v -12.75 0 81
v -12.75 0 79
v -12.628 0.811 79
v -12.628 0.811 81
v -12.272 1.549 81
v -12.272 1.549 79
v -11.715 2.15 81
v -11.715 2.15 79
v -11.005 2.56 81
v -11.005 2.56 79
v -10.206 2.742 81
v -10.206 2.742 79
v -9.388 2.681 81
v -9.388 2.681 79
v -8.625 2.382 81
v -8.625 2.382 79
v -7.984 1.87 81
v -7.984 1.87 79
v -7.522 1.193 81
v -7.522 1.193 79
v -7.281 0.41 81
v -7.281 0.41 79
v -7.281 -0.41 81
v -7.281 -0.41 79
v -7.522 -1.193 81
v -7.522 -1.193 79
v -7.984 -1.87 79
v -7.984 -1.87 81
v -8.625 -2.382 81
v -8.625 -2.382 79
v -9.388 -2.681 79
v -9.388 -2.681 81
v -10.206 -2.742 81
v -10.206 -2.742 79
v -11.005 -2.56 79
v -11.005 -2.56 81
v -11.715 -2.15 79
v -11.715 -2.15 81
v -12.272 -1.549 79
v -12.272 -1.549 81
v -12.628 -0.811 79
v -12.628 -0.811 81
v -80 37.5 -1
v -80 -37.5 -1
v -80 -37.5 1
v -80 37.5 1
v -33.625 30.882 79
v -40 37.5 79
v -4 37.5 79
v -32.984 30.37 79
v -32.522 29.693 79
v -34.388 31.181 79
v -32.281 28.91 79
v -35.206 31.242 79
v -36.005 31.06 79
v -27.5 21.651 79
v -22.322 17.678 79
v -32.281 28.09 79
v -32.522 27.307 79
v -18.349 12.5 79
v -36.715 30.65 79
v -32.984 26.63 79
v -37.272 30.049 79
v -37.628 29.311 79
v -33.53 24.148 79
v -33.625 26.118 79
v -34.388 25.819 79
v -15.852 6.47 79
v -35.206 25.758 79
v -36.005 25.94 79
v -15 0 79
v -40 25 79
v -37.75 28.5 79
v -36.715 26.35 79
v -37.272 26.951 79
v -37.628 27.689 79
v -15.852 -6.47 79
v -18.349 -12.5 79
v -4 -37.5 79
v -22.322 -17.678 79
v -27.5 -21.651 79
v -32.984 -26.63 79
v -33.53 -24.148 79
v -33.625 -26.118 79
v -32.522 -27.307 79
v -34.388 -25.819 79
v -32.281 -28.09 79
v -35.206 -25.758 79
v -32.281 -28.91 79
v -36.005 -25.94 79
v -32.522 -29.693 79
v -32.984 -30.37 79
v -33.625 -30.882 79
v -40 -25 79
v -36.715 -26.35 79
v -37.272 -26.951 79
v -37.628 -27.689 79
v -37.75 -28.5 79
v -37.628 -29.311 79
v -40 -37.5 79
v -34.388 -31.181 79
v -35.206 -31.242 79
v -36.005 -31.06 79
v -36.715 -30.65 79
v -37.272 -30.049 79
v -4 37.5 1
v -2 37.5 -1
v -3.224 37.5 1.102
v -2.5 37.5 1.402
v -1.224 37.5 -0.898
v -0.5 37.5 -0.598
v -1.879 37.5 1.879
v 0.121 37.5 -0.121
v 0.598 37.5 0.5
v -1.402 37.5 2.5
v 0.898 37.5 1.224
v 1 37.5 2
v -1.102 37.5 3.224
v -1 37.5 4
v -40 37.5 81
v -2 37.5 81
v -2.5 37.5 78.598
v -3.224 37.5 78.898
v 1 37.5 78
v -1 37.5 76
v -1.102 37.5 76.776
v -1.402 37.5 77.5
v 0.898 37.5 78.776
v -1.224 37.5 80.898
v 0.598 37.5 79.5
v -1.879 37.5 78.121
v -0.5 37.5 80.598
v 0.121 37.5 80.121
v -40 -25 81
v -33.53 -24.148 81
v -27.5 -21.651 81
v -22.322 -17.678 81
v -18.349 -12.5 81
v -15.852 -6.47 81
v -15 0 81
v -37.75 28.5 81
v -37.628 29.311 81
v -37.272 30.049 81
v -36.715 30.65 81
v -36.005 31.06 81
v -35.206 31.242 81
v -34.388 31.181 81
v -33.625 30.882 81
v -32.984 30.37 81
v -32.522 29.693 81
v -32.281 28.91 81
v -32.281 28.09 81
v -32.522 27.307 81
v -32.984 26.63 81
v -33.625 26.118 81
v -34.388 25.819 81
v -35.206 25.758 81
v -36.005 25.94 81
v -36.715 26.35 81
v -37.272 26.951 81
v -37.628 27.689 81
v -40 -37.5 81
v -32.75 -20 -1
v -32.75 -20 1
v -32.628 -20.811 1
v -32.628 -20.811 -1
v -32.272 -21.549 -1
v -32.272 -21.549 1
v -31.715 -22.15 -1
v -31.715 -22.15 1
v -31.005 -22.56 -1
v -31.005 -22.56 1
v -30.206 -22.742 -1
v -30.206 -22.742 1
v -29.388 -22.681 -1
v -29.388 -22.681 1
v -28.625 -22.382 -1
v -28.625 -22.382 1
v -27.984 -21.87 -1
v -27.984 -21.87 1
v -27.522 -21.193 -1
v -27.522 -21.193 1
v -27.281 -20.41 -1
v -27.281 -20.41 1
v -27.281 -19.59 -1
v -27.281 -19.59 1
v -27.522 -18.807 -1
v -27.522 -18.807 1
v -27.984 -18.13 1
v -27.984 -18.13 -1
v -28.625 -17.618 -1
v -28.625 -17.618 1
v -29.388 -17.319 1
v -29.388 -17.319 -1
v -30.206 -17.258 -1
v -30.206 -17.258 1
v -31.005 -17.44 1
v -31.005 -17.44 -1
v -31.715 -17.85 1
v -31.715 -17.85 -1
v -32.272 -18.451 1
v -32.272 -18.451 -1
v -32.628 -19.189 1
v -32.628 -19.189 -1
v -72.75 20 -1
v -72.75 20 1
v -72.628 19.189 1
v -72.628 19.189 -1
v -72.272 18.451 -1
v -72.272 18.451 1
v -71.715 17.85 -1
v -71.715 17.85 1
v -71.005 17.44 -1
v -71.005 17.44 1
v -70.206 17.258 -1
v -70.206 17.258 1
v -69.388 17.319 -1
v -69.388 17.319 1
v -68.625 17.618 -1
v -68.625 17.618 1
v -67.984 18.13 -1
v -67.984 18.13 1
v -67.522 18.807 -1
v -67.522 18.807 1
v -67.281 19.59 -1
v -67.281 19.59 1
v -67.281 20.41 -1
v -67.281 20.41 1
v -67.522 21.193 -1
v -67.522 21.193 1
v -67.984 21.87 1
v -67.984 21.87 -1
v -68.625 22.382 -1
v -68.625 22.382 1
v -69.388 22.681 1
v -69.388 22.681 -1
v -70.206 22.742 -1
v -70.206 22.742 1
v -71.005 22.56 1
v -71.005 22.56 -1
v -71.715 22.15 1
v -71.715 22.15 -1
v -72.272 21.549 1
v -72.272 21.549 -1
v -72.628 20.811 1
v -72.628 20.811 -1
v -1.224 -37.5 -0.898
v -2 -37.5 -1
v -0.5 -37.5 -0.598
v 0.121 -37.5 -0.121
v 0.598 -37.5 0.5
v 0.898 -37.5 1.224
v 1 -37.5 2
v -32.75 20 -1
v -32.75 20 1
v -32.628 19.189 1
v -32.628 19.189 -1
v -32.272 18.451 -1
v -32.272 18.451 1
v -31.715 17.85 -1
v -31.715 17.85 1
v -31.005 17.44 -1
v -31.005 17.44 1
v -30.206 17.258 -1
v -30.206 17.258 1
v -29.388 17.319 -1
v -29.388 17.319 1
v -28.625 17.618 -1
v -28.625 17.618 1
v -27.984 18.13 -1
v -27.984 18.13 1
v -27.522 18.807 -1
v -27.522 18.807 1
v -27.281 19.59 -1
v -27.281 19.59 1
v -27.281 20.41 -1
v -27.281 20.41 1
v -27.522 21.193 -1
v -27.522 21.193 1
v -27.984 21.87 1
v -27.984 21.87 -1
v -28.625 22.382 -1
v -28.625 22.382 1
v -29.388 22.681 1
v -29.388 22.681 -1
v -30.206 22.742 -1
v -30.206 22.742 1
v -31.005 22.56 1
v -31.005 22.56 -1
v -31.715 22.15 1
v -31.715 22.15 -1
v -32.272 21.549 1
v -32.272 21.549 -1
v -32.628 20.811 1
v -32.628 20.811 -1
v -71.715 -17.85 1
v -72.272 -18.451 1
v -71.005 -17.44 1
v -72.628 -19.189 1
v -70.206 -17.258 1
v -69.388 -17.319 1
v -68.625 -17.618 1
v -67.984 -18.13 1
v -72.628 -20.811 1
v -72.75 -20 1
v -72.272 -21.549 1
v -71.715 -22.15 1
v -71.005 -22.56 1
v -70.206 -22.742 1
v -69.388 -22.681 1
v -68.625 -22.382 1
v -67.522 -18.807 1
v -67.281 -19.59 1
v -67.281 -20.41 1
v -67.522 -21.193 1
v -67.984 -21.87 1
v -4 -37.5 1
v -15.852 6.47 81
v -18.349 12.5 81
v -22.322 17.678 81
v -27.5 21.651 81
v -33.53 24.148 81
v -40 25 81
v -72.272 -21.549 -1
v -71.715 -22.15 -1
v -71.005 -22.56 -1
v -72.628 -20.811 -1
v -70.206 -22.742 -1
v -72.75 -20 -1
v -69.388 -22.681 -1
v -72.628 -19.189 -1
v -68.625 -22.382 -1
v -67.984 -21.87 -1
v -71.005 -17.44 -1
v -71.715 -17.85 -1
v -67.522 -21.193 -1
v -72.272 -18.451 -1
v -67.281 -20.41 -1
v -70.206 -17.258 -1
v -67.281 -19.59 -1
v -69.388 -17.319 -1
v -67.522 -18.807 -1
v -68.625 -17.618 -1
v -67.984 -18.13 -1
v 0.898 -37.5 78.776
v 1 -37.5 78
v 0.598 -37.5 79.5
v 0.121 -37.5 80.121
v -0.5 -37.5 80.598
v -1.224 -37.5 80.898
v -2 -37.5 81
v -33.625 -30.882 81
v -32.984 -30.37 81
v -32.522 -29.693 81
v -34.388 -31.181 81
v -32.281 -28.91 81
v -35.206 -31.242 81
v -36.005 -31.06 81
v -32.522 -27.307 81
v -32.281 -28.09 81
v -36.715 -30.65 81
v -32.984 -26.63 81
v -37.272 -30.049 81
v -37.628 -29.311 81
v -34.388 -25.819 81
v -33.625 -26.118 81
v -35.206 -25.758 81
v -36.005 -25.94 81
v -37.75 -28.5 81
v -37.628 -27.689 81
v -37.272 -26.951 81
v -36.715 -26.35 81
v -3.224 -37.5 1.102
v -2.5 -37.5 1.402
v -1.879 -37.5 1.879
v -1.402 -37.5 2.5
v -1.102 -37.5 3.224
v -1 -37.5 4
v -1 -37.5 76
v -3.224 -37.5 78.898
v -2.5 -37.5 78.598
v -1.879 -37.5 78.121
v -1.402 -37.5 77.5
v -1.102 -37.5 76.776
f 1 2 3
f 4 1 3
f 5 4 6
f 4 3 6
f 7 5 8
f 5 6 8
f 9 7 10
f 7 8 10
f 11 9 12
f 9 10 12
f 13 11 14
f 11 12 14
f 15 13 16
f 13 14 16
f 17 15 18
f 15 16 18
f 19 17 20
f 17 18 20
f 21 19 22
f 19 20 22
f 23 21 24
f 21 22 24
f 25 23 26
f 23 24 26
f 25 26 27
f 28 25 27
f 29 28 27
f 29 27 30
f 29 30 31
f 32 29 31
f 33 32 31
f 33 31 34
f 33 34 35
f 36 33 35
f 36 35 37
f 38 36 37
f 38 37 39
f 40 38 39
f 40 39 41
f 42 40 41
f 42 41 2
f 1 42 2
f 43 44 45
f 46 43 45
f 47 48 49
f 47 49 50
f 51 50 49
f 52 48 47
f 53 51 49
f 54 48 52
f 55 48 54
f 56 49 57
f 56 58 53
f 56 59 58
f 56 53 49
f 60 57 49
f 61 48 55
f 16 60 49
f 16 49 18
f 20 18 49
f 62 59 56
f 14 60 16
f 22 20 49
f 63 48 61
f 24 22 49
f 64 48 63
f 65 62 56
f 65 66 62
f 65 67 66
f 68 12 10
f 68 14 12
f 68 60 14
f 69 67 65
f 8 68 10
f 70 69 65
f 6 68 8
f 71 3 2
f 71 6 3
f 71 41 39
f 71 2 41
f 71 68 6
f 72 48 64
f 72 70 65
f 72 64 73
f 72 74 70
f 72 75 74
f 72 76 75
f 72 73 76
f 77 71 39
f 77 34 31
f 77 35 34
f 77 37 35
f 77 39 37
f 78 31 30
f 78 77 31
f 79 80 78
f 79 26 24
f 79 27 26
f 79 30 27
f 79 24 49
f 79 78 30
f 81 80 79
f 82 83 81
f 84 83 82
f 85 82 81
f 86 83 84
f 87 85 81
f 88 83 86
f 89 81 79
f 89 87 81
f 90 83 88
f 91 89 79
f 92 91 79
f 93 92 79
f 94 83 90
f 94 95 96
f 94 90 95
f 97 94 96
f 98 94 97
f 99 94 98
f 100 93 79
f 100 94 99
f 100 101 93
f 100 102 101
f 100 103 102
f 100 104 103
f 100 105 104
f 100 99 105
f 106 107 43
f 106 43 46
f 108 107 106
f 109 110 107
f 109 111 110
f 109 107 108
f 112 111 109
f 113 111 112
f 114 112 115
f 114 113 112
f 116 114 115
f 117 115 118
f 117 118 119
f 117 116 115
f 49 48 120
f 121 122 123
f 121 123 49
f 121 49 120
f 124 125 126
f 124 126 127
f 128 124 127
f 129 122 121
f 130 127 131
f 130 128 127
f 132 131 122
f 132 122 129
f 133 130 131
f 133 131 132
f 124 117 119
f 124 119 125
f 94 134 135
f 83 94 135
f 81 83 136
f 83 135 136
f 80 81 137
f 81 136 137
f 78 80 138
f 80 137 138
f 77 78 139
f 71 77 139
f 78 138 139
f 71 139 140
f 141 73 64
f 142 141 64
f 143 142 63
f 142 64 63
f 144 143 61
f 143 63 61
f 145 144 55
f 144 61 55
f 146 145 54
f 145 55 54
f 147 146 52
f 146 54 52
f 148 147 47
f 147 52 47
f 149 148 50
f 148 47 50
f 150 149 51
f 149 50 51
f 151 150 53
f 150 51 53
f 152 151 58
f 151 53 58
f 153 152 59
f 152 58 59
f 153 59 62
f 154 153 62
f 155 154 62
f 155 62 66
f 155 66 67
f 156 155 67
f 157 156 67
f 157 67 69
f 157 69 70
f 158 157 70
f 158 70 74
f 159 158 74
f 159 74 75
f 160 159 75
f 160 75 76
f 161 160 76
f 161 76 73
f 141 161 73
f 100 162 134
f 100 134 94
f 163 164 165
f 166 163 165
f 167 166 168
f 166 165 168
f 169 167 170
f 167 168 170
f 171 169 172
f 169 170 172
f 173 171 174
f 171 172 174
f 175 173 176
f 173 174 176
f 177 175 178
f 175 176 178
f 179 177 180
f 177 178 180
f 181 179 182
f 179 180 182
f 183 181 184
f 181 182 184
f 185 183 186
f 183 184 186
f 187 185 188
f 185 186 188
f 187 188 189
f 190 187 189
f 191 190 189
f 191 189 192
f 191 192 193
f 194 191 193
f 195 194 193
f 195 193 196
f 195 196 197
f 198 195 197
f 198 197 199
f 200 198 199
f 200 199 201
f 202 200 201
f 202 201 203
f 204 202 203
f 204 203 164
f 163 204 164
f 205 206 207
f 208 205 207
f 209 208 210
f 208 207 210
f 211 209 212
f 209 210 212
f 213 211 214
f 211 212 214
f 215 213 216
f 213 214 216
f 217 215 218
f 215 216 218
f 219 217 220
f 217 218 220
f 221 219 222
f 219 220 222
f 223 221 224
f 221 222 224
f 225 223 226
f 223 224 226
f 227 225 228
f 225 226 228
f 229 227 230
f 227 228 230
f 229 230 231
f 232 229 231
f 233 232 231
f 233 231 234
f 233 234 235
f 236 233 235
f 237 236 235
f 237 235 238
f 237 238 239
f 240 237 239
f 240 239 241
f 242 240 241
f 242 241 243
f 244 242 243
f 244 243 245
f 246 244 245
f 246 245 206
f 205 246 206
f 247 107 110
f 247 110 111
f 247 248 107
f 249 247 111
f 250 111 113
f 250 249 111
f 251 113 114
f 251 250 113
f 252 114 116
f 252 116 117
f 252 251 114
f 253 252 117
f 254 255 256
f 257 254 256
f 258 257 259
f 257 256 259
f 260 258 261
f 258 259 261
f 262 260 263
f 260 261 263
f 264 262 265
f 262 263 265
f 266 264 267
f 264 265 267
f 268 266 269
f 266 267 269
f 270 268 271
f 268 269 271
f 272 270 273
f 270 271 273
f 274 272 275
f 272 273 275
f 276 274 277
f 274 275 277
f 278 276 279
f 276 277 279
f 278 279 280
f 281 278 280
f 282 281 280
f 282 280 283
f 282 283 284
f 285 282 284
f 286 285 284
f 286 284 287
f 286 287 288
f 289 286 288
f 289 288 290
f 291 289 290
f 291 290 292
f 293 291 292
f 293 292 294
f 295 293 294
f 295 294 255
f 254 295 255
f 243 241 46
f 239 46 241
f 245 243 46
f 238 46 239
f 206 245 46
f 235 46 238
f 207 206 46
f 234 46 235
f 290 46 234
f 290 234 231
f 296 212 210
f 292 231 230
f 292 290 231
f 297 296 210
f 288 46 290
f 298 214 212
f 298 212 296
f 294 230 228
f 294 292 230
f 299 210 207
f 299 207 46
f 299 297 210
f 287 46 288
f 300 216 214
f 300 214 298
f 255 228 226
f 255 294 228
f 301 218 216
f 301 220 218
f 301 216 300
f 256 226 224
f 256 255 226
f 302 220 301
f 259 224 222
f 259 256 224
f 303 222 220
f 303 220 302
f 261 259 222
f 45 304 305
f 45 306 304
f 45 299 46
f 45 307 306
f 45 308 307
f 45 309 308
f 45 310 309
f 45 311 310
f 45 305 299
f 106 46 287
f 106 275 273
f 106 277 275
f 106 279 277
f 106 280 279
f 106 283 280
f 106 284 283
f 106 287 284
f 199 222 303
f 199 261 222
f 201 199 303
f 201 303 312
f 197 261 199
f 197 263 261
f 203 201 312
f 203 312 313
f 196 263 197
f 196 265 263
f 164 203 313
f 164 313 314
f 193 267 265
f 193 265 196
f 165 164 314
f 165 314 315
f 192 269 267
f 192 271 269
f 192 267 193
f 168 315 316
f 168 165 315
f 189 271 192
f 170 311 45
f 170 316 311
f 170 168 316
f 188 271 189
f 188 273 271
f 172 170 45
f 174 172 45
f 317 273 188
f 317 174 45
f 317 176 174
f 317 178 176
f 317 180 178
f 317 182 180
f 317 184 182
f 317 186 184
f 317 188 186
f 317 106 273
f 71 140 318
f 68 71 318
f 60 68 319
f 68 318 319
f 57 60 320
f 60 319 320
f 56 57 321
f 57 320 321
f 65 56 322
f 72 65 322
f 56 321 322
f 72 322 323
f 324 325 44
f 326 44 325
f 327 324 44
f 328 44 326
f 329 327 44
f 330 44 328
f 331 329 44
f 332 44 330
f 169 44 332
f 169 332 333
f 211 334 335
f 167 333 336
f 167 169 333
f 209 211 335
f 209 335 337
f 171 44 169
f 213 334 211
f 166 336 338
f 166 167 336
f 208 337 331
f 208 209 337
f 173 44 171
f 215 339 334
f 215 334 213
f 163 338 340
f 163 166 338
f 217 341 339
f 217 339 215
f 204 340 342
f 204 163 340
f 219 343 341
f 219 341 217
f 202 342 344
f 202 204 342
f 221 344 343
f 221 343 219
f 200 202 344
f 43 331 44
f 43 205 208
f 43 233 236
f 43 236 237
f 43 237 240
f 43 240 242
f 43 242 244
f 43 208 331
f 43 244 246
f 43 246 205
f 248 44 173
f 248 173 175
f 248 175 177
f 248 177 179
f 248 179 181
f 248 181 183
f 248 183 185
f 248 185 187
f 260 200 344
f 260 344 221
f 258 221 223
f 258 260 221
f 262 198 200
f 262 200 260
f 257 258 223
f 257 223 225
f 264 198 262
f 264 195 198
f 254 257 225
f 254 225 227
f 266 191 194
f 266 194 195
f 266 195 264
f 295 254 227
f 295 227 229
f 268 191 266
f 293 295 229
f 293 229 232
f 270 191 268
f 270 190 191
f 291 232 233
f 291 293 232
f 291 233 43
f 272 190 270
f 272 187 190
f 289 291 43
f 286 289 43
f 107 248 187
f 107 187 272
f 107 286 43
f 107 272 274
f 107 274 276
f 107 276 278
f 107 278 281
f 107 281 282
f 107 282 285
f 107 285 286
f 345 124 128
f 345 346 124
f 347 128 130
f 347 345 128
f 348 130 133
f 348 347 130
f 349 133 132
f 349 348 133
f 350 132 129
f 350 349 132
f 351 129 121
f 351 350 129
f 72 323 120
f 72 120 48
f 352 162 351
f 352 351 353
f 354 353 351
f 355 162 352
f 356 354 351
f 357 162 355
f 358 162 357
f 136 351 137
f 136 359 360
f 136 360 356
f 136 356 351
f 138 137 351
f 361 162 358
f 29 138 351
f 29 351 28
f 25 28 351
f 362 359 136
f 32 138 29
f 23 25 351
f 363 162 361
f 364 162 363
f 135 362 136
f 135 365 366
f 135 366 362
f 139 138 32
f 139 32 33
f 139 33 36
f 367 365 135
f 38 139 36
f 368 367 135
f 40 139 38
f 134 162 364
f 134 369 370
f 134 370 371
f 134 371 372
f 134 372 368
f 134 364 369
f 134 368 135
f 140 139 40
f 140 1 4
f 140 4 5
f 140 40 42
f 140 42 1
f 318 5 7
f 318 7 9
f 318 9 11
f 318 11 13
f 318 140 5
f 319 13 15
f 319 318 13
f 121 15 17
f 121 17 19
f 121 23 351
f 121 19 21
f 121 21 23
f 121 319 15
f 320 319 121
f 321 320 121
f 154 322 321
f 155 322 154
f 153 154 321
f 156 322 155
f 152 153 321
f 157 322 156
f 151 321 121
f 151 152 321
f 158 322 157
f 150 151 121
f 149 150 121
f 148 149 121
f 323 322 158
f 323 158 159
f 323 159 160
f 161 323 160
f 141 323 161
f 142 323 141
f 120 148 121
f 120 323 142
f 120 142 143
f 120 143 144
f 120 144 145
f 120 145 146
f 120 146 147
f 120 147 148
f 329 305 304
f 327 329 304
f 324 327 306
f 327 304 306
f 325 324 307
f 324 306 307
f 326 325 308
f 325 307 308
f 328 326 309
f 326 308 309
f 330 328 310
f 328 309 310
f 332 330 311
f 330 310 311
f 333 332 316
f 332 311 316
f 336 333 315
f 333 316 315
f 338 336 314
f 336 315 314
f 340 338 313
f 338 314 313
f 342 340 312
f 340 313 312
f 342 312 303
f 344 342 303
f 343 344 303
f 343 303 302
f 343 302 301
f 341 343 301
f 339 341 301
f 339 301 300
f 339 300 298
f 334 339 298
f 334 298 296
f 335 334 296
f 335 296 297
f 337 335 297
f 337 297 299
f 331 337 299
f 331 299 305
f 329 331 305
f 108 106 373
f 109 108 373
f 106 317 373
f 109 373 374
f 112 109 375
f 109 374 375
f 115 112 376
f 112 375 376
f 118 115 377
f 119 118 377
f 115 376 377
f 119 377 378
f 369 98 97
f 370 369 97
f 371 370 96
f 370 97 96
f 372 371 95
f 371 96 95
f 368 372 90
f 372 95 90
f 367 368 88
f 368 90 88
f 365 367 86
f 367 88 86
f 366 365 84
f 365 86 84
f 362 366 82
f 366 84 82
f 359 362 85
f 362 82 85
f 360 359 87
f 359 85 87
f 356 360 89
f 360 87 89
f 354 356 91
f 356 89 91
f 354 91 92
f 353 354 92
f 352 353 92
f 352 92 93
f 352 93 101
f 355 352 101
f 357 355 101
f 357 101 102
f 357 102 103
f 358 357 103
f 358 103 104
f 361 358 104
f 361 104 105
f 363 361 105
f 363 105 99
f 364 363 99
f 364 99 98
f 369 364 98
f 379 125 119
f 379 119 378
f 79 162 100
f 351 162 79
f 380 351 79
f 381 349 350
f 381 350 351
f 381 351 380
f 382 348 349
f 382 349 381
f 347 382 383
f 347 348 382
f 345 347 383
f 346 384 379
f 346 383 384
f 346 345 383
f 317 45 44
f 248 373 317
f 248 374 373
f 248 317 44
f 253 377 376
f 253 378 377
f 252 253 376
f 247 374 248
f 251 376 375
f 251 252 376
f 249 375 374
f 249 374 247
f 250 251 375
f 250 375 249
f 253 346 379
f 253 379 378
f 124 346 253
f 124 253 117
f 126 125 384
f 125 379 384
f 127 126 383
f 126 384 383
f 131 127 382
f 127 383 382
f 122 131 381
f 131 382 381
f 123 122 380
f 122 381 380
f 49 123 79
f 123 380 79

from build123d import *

# Parameters (mm, degrees)
F2_W           = 75
F2_H           = 2
F4_R           = 3
F6_DEPTH       = 2
F9_D           = 5.5
F9_DEPTH       = 18
F9_TIP         = 1.6523667023
F9_ON_F7_D     = 5.5
F9_ON_F7_DEPTH = 18
F9_ON_F7_TIP   = 1.6523667023


with BuildPart() as f3:
    # F3: sweep along a path in F0
    with BuildLine(Plane.XZ) as f3_path:
        Line((-80, 0), (0, 0))
        Line((0, 0), (0, 80))
        Line((0, 80), (-40, 80))
    # F2 (on line) → F3 (sweep)
    with BuildSketch(Plane.YZ.offset(-80)):
        Rectangle(F2_W, F2_H)
    sweep(path=f3_path.line, transition=Transition.RIGHT)

    # F4
    f4_edges = [f3.edges().sort_by_distance(p)[0] for p in [
        (-1, 0, 1),
        (-1, 0, 79),
        (1, 0, -1),
        (1, 0, 81),
    ]]
    fillet(f4_edges, radius=F4_R)

    # F5 (on face) → F6 (cut, through all)
    with BuildSketch(Plane.XY.offset(81)):
        with BuildLine():
            ThreePointArc((-40, -25), (-22.3223304703, -17.6776695297), (-15, 0))
            ThreePointArc((-15, 0), (-22.3223304703, 17.6776695297), (-40, 25))
            Line((-40, 25), (-40, -25))
        make_face()
    extrude(amount=-F6_DEPTH, mode=Mode.SUBTRACT)

    # F9
    with Locations(Plane.XY.offset(81)):
        with Locations((-35, 28.5), (-10, 0), (-35, -28.5)):
            Hole(F9_D / 2, depth=F9_DEPTH)
            with Locations((0, 0, -(F9_DEPTH + F9_TIP / 2))):  # 118° drill point
                Cone(0, F9_D / 2, F9_TIP, mode=Mode.SUBTRACT)

    # F9 on F7
    with Locations(Plane(origin=(0, 0, -1), x_dir=(1, 0, 0), z_dir=(0, 0, -1))):
        with Locations((-30, 20), (-30, -20), (-70, -20), (-70, 20)):
            Hole(F9_ON_F7_D / 2, depth=F9_ON_F7_DEPTH)
            with Locations((0, 0, -(F9_ON_F7_DEPTH + F9_ON_F7_TIP / 2))):  # 118° drill point
                Cone(0, F9_ON_F7_D / 2, F9_ON_F7_TIP, mode=Mode.SUBTRACT)


solid = f3.part
